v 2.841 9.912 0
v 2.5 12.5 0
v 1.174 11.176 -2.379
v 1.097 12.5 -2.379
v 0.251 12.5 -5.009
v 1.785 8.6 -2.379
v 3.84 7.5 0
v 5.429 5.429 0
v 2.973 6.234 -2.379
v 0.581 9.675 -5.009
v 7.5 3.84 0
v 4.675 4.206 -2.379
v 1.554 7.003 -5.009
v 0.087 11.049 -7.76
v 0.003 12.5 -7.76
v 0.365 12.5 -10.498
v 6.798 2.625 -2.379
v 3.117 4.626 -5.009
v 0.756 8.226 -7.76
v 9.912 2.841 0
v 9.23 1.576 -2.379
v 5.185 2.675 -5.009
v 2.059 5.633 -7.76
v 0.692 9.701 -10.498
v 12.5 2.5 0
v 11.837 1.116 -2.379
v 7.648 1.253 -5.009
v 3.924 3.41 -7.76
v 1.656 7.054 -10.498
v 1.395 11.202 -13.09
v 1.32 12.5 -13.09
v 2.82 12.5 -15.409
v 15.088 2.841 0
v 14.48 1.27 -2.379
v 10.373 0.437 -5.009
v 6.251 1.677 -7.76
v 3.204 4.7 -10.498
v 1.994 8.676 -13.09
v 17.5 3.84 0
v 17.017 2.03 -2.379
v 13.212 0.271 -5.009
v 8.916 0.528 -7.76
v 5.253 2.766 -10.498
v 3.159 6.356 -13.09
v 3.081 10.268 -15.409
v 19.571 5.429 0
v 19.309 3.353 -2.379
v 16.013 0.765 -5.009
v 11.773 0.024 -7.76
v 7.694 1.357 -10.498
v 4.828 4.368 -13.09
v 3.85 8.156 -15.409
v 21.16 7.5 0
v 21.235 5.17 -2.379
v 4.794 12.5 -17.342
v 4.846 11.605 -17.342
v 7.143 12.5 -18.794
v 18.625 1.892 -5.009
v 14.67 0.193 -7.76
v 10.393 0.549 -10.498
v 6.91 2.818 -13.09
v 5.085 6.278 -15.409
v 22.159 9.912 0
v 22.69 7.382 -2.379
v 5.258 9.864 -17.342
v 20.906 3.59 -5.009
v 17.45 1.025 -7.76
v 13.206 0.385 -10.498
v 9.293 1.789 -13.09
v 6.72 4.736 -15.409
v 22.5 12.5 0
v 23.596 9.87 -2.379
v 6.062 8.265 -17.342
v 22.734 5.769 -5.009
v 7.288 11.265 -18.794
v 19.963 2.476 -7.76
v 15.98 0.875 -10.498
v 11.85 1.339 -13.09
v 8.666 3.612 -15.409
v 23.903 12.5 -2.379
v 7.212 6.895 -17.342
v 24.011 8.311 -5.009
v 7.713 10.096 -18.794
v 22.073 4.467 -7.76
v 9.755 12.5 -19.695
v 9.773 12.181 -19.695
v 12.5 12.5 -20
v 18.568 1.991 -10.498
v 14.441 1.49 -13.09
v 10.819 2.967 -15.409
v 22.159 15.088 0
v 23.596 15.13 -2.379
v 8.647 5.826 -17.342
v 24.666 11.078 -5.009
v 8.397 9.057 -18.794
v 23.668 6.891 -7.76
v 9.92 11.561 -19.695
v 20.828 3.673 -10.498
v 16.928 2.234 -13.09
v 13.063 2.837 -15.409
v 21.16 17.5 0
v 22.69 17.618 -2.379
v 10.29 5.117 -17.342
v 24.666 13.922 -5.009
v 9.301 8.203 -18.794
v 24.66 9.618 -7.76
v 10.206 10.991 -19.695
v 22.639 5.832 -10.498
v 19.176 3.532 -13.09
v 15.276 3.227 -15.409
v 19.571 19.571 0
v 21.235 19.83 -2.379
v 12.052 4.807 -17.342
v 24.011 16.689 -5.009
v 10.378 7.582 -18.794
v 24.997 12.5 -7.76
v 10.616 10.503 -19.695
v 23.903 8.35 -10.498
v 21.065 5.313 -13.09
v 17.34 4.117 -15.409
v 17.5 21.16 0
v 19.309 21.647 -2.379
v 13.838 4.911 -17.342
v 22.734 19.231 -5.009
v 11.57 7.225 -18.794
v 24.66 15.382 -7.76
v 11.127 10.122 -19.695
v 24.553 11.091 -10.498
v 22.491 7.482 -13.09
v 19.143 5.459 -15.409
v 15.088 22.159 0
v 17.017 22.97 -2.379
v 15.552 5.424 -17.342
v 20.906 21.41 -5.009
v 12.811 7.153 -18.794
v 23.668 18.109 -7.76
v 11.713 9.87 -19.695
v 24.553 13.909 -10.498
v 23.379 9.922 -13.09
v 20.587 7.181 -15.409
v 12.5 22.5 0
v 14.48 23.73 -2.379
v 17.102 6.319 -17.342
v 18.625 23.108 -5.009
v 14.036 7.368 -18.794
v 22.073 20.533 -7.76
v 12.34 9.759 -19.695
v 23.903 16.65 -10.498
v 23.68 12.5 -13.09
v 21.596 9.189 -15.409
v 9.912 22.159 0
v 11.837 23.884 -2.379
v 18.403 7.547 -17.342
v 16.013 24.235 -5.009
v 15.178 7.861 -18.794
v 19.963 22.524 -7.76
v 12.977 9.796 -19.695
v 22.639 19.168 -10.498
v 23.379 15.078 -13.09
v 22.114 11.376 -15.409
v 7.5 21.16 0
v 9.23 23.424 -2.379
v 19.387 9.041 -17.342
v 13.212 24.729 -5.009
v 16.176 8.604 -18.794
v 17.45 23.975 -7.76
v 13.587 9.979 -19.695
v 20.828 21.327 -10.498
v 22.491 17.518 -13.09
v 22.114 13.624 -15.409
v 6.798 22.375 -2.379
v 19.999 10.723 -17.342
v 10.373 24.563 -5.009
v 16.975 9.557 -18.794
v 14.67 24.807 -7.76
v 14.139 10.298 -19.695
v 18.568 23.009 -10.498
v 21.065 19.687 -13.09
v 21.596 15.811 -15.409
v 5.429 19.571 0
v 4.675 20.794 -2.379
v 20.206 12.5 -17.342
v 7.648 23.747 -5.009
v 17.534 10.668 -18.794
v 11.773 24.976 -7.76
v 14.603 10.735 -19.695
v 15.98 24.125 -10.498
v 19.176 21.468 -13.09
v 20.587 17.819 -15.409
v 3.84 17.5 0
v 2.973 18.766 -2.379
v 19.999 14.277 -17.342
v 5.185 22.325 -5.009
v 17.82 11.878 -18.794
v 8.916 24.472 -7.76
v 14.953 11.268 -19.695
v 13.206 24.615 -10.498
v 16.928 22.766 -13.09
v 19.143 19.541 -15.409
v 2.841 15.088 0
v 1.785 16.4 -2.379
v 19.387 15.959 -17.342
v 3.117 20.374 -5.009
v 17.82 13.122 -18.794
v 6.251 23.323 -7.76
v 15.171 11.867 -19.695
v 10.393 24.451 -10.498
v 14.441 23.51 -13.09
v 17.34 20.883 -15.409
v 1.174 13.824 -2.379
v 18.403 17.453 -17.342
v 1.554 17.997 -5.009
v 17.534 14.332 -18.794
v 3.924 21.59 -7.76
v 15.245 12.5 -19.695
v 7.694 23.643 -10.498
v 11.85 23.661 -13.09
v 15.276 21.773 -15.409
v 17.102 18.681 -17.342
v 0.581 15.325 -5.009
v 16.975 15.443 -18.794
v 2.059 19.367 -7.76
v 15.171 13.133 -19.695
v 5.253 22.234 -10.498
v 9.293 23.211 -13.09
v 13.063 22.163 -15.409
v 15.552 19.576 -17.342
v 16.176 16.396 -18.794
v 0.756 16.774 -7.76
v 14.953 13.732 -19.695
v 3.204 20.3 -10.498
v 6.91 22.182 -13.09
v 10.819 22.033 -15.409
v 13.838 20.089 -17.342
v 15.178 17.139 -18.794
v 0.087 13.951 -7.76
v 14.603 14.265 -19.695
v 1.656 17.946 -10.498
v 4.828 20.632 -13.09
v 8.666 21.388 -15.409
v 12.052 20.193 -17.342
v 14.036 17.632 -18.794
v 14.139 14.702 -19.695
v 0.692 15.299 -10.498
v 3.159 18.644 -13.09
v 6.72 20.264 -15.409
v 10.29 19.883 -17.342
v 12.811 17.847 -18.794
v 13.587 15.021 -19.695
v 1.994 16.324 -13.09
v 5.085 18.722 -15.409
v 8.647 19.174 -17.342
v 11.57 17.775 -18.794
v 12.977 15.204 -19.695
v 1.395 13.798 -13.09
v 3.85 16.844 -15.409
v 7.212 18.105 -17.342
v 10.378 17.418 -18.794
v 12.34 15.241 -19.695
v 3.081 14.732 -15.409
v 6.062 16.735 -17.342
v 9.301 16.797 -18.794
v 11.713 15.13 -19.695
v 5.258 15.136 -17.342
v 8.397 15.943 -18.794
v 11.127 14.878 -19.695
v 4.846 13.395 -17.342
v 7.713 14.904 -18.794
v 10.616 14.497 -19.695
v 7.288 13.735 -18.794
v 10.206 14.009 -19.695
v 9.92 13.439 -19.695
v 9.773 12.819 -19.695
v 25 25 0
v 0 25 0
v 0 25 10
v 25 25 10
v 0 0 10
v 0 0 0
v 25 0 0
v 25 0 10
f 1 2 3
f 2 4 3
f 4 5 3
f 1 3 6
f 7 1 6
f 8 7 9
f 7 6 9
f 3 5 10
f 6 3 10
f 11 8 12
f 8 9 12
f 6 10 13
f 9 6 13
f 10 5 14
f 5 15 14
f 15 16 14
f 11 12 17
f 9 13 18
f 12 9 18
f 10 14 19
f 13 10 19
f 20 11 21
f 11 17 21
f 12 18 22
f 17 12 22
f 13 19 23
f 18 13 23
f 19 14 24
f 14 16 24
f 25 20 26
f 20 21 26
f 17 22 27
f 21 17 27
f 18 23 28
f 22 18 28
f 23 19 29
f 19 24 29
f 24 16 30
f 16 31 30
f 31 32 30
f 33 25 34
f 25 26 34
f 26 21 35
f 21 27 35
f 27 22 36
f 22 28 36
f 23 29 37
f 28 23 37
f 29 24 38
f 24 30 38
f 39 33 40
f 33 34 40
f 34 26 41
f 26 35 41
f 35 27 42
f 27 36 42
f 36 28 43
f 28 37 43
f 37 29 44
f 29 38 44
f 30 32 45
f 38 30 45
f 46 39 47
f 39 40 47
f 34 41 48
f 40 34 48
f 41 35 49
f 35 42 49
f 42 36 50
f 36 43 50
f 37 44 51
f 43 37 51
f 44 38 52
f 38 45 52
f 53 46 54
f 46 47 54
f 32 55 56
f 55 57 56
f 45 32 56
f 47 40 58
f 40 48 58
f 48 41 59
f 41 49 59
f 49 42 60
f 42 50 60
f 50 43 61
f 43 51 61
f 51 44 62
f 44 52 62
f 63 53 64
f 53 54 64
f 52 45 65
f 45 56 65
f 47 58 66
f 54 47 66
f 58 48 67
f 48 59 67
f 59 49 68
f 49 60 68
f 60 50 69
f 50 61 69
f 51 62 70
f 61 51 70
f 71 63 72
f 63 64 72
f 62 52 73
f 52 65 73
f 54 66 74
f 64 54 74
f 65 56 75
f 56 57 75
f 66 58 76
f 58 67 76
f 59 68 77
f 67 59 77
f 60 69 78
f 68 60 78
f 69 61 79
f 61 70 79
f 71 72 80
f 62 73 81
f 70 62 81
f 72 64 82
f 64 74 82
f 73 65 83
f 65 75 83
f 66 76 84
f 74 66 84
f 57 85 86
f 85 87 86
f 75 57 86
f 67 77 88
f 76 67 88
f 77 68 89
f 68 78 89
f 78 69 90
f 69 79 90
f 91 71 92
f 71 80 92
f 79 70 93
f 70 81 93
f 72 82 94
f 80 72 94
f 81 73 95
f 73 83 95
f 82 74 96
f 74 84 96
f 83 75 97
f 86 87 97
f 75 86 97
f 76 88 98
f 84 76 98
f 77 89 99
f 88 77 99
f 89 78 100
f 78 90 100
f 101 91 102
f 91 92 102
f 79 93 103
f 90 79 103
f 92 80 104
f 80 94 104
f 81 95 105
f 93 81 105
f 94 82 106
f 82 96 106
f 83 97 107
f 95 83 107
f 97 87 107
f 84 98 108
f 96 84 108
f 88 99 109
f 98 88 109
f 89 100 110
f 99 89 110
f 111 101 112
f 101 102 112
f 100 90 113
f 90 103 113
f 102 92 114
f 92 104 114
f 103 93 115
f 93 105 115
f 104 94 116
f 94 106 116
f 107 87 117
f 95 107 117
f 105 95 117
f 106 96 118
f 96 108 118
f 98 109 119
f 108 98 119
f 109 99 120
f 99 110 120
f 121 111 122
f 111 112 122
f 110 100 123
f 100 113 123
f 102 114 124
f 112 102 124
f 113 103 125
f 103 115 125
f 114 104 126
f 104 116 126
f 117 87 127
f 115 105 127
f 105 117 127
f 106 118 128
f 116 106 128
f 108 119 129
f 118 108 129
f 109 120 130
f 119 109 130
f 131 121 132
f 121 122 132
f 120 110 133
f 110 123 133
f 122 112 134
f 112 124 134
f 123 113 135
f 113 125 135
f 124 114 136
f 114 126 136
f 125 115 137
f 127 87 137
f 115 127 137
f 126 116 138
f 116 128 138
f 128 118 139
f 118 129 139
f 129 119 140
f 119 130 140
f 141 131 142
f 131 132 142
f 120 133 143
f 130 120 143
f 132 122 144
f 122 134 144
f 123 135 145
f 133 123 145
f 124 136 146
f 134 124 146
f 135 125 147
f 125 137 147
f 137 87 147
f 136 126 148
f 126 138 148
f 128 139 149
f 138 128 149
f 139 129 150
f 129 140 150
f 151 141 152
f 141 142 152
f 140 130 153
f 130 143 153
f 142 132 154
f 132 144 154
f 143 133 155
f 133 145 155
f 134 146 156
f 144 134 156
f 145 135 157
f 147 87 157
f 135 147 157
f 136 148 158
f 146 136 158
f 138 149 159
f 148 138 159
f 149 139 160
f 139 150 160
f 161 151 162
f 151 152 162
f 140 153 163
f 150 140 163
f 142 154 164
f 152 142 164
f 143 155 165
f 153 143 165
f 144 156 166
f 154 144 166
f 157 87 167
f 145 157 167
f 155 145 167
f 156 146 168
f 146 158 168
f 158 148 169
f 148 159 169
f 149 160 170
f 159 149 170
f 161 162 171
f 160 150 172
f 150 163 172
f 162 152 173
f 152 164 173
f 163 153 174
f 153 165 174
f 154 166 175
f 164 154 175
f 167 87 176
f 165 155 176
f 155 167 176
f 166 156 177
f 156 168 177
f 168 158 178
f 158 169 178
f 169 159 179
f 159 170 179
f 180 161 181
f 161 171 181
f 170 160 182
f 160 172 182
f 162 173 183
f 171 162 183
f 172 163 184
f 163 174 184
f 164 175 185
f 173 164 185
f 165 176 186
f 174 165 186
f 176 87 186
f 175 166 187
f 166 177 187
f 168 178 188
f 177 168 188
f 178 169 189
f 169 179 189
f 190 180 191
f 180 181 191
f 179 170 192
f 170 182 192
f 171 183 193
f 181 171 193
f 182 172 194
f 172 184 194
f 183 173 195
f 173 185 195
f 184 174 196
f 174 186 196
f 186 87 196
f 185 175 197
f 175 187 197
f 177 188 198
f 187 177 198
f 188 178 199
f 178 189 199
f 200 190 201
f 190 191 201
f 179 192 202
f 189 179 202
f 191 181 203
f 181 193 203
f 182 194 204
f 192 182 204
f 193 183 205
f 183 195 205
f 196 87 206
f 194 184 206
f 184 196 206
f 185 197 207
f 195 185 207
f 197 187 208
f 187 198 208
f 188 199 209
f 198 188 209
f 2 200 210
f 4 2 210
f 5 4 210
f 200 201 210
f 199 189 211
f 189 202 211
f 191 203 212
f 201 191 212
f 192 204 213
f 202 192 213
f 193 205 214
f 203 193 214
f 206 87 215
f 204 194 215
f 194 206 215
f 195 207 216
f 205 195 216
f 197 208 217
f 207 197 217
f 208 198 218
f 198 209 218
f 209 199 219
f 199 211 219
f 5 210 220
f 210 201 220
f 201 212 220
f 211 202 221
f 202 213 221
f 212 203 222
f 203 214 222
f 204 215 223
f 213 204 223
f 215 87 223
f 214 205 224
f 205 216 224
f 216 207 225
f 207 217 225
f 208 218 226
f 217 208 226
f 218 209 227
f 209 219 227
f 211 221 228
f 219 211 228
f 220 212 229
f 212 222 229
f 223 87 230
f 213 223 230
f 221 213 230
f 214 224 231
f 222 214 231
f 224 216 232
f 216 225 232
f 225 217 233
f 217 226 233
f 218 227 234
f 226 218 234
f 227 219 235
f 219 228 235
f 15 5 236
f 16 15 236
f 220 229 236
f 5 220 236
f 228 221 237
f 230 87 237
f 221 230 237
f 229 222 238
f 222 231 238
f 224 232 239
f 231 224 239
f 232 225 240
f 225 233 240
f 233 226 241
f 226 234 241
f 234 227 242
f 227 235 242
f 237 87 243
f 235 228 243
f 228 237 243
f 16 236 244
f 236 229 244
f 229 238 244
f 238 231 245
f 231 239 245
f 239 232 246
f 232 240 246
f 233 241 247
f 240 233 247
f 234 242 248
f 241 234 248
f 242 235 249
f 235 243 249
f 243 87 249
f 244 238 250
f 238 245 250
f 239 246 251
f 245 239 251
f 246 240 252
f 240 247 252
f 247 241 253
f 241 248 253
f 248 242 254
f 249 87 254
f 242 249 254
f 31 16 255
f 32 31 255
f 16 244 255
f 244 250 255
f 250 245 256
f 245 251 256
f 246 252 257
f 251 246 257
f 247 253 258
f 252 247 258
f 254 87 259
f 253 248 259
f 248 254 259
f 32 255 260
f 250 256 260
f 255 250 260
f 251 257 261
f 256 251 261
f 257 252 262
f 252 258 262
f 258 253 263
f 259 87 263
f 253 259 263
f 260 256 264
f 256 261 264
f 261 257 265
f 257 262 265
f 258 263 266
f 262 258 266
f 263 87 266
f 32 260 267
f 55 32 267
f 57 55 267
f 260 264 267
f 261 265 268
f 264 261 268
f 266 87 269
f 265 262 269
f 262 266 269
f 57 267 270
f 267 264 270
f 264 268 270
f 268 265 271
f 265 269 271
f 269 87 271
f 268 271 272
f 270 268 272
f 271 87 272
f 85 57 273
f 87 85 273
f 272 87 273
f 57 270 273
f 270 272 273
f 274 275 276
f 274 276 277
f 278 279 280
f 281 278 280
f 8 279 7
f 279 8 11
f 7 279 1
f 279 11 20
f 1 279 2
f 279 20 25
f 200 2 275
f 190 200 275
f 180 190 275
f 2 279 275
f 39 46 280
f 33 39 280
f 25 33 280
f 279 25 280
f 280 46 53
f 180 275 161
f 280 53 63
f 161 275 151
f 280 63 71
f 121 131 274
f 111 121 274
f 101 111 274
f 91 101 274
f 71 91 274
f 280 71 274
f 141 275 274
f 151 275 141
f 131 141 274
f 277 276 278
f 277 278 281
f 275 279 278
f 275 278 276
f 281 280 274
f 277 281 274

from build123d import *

# Parameters (mm, degrees)
SKETCH1_W           = 25
SKETCH1_H           = 25
BOSS_EXTRUDE1_DEPTH = 10


with BuildPart() as part:
    # Sketch1 → Boss-Extrude1 (new body)
    with BuildSketch(Plane.XY):
        with Locations((12.5, 12.5)):
            Rectangle(SKETCH1_W, SKETCH1_H)
    extrude(amount=BOSS_EXTRUDE1_DEPTH)

    # Sketch3 → Revolve1 (revolve)
    with BuildSketch(Plane(origin=(0, 12.5, 0), x_dir=(-1, 0, 0), z_dir=(0, -1, 0))):
        with BuildLine():
            Line((-12.5, 20), (-12.5, -5))
            ThreePointArc((-12.5, -5), (0, 7.5), (-12.5, 20))
        make_face()
    revolve(axis=Axis((12.5, 12.5, 0), (0, 0, 1)))


solid = part.part
